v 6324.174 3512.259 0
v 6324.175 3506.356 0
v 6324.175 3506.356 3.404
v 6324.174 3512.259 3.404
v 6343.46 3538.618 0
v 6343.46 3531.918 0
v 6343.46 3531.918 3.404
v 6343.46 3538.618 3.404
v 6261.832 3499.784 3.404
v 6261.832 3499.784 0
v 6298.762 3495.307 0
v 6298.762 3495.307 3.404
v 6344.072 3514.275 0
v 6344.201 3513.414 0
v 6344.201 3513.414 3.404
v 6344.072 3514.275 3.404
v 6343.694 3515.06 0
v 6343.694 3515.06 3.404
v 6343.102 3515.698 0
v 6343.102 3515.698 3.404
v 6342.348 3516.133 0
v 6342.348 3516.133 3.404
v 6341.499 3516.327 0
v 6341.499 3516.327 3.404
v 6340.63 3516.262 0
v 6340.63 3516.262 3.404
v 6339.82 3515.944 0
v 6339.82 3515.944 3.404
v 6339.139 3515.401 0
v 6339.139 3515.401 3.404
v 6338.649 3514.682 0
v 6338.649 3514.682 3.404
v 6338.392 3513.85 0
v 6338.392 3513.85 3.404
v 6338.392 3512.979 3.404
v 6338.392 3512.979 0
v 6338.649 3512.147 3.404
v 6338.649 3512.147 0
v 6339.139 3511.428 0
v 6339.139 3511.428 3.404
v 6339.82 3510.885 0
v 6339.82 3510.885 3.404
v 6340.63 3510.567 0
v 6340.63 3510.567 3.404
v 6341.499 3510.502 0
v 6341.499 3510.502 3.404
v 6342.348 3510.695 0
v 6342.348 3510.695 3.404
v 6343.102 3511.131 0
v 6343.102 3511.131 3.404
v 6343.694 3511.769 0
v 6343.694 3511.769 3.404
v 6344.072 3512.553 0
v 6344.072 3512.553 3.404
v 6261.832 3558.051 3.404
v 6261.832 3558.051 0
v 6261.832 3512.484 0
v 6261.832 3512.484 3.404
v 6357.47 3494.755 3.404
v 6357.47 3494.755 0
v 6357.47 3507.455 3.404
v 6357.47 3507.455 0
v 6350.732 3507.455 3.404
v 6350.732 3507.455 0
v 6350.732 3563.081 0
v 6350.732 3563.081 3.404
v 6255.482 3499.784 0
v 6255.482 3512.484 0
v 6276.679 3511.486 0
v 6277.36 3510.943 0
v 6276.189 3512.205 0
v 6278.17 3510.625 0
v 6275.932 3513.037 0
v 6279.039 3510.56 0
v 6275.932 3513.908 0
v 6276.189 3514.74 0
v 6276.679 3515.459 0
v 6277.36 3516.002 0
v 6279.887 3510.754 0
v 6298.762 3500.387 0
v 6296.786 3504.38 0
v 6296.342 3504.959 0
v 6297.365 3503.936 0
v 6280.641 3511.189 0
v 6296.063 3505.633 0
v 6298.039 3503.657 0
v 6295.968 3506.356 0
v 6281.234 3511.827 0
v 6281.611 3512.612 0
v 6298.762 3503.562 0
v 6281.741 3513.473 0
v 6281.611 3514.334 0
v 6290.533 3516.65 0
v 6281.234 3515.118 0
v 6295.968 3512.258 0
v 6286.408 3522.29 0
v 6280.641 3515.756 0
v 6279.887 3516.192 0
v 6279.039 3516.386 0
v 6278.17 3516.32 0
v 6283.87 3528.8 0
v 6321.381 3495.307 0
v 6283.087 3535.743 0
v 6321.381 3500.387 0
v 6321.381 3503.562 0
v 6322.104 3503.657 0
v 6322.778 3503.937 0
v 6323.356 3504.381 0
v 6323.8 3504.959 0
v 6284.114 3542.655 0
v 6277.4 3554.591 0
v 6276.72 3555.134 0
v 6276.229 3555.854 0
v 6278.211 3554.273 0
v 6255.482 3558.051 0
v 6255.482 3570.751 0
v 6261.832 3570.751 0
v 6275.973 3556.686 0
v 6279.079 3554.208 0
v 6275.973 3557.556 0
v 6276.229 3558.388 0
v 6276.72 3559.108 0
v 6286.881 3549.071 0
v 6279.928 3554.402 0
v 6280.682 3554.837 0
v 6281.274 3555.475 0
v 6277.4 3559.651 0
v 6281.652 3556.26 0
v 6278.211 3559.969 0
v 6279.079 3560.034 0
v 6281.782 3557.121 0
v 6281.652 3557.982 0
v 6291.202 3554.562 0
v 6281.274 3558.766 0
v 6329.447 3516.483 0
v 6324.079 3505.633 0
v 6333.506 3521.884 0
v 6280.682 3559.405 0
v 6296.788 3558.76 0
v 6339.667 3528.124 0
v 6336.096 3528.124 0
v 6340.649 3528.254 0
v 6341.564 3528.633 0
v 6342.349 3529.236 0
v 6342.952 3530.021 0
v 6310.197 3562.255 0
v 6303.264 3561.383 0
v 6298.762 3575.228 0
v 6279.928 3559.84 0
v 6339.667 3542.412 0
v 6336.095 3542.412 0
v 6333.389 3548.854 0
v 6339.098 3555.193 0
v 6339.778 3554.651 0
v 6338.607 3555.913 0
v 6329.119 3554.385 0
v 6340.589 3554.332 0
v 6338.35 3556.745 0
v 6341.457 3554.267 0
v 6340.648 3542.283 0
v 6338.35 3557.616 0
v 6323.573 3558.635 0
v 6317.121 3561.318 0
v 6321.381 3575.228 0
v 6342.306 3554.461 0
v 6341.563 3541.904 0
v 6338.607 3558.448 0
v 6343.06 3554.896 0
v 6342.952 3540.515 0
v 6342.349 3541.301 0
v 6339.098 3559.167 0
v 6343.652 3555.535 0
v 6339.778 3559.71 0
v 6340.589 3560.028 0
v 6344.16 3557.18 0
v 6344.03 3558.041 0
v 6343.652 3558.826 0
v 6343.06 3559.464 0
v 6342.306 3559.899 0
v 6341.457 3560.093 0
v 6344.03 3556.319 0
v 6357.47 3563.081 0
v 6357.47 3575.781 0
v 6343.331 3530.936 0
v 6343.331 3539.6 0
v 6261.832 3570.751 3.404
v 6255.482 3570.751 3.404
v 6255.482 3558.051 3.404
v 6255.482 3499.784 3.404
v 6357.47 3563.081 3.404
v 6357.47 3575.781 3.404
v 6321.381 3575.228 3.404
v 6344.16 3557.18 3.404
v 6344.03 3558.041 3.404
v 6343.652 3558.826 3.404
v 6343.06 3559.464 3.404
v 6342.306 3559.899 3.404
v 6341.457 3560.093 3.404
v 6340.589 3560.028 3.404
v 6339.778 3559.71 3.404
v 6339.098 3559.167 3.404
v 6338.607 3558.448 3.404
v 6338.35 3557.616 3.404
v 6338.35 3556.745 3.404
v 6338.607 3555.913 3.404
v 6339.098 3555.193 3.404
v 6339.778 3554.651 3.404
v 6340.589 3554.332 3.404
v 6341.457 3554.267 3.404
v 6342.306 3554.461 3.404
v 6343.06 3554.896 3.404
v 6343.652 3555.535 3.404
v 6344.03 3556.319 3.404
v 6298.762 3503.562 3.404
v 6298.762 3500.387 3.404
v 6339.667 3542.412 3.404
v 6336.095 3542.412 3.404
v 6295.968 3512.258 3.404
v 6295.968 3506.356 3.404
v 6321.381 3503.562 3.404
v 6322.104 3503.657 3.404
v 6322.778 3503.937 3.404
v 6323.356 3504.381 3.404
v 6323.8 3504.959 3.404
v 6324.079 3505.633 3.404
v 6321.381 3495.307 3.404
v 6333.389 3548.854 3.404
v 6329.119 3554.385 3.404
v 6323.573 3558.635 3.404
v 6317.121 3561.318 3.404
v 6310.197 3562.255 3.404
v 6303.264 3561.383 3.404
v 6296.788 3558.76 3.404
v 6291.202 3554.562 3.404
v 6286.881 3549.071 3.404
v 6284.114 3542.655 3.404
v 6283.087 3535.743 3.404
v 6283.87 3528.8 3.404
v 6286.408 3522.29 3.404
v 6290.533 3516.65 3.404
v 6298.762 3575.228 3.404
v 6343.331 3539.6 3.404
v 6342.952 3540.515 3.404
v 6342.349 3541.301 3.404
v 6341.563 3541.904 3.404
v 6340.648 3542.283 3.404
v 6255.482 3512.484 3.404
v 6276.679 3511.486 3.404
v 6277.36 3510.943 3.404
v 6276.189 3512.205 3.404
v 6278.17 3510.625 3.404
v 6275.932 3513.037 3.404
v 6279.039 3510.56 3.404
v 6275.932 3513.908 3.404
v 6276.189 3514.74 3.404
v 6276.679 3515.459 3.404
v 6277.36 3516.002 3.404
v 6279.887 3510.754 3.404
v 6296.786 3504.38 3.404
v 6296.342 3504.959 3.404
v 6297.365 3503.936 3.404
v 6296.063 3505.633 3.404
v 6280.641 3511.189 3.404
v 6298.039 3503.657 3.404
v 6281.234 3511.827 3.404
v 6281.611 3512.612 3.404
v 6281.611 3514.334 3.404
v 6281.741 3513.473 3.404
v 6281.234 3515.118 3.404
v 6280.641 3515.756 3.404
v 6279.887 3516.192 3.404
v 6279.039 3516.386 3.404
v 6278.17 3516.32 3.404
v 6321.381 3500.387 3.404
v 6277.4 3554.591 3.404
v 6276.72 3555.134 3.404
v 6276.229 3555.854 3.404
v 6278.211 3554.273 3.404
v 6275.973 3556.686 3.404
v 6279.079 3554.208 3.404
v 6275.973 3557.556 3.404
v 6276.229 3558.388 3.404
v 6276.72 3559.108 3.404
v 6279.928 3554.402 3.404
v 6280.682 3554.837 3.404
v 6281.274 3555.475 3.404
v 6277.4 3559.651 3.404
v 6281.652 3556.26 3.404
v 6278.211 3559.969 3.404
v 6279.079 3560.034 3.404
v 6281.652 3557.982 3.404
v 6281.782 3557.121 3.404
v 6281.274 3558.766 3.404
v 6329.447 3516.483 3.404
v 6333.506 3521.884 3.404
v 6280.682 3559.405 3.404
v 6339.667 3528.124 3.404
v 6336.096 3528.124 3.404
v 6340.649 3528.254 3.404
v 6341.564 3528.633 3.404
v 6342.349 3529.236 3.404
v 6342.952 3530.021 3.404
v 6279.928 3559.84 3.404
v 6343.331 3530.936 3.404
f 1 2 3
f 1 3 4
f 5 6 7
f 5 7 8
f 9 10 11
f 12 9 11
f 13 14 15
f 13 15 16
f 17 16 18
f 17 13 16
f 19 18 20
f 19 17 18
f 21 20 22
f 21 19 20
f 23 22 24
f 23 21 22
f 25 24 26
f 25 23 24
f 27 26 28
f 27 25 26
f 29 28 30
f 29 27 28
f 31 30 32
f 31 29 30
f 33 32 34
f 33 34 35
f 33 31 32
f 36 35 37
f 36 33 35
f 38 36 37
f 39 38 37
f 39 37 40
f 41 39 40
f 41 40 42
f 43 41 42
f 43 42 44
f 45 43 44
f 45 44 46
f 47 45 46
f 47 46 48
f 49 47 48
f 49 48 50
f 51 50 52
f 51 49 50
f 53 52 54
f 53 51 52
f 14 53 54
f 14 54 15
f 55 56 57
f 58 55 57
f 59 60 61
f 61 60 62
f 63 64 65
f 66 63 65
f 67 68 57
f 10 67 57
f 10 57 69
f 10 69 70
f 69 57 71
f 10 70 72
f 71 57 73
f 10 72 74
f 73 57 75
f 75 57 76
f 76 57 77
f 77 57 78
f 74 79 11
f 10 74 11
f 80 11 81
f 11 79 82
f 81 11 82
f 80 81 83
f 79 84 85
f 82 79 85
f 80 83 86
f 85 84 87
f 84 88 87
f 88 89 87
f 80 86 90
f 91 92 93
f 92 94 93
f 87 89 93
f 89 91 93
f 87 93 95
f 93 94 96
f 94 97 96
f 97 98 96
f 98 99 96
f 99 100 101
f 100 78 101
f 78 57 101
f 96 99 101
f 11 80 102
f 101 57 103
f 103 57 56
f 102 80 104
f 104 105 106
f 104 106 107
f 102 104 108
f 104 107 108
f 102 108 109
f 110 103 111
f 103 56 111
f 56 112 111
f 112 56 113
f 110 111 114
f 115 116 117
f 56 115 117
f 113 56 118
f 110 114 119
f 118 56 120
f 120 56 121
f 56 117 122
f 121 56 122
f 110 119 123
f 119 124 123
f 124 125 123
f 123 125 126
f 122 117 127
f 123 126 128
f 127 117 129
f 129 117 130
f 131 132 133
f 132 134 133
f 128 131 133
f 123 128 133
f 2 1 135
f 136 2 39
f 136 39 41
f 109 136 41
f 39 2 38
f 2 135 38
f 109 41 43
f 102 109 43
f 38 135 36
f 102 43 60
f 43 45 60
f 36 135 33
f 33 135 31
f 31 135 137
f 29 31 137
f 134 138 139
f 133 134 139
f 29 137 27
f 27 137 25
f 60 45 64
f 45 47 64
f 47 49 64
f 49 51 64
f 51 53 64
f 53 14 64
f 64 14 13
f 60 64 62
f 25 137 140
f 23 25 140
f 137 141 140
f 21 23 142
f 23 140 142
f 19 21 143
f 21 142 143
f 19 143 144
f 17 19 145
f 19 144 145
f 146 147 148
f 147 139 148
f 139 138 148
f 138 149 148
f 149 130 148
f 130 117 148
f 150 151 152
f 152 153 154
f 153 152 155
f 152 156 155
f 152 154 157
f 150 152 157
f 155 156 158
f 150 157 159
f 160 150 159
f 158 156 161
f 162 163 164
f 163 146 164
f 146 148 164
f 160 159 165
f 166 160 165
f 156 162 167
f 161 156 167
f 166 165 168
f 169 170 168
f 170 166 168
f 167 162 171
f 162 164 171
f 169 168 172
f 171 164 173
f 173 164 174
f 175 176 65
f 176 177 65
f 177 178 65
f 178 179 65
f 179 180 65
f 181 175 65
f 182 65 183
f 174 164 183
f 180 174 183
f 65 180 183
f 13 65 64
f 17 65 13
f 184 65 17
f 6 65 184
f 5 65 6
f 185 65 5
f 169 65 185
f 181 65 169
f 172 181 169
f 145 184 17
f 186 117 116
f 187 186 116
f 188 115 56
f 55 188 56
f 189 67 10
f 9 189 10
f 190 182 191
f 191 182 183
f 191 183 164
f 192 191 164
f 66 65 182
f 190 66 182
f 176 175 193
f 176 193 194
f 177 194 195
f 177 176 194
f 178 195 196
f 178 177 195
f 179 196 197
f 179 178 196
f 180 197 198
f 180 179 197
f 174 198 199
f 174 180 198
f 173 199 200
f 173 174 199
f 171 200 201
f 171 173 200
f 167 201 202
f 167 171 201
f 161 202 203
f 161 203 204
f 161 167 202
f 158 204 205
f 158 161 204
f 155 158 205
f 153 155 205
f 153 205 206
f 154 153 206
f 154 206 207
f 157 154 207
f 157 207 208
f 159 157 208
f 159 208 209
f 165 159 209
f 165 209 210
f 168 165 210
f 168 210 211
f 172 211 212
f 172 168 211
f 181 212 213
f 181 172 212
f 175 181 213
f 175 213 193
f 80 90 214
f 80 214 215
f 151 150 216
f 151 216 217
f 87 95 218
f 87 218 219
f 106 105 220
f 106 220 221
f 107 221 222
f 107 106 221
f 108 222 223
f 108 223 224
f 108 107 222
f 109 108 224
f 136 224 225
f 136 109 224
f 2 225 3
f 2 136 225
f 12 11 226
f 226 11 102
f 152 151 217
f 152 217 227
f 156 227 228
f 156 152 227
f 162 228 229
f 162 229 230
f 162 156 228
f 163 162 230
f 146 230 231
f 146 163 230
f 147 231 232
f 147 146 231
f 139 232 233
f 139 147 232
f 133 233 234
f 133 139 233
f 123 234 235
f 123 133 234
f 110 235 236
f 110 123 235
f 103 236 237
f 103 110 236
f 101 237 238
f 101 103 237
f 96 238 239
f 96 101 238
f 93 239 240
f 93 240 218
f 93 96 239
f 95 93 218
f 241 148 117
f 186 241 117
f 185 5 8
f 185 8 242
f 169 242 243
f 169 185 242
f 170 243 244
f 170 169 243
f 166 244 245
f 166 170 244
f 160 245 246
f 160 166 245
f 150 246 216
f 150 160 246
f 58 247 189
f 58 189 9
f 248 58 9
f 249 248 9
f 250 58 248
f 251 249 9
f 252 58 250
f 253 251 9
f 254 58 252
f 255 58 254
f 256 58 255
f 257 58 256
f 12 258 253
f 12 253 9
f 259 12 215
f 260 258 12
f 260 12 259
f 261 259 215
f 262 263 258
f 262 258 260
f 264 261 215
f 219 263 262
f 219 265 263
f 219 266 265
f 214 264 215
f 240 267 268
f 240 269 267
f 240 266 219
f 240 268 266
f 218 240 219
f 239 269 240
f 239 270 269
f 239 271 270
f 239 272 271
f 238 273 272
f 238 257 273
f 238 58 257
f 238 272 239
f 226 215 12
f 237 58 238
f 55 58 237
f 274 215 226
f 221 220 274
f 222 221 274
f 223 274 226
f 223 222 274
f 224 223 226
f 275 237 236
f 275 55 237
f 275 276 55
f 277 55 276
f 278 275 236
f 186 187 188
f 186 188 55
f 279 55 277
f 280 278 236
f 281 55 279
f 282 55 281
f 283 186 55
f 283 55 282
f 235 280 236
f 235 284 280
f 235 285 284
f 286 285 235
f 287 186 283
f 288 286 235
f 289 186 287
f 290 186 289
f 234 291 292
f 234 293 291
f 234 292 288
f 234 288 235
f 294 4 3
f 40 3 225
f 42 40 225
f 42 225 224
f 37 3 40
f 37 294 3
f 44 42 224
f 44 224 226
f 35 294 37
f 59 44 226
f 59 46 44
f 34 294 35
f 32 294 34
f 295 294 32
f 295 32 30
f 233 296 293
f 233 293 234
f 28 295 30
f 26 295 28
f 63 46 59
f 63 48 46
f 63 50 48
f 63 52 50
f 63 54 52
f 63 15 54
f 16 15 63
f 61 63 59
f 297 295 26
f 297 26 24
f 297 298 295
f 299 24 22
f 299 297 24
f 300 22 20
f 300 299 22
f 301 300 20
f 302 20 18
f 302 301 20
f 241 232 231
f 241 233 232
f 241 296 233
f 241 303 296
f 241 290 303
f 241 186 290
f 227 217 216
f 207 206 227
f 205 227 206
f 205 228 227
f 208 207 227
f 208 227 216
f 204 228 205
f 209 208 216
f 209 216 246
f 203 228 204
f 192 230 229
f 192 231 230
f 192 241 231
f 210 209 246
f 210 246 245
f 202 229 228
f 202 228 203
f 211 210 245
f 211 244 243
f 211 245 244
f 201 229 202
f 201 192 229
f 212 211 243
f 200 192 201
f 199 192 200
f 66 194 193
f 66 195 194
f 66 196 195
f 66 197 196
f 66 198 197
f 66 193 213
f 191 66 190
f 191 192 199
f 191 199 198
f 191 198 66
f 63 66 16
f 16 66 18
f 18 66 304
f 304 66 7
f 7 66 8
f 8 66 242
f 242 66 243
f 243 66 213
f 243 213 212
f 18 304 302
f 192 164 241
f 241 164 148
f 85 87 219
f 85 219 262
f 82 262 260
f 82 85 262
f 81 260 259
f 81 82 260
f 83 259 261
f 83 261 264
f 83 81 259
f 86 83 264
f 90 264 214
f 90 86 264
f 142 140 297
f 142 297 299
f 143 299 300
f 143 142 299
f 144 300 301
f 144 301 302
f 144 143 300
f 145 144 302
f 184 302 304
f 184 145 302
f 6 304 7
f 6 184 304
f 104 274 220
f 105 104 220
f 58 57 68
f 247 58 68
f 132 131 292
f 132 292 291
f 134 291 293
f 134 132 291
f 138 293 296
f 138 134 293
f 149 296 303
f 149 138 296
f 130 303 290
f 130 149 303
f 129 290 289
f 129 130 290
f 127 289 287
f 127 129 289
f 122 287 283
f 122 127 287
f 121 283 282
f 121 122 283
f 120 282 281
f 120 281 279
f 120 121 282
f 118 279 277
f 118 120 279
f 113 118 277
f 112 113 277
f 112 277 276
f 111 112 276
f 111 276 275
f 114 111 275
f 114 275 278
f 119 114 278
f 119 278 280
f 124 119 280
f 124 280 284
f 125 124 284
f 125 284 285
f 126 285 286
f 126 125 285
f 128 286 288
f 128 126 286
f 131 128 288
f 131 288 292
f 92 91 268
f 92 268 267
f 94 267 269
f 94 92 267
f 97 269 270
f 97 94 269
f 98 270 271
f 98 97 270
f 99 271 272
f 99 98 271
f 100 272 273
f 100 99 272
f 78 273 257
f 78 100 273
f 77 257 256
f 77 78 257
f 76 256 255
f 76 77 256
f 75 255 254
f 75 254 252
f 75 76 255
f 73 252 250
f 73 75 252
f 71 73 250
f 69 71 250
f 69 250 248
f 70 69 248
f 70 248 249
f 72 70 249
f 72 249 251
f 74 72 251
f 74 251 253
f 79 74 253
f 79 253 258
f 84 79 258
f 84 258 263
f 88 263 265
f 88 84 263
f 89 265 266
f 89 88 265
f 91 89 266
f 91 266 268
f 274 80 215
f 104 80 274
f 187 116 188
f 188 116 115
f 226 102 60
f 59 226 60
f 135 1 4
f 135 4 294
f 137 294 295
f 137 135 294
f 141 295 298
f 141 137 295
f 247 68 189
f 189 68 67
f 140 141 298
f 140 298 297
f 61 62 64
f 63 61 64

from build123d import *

# Parameters (mm, degrees)
SKETCH1_R           = 2.921000021
BOSS_EXTRUDE1_DEPTH = 3.4036


with BuildPart() as part:
    # Sketch1 → Boss-Extrude1 (new body)
    with BuildSketch(Plane.XY):
        Polygon((6298.761762124, 3495.306881262), (6321.380962278, 3495.307266858), (6357.4701776, 3494.754624258), (6357.4701776, 3507.454624258), (6350.731610594, 3507.454624258), (6350.731610594, 3563.080624258), (6357.4701776, 3563.080624258), (6357.4701776, 3575.780624258), (6321.380962278, 3575.227981658), (6298.761762124, 3575.228367254), (6261.831610594, 3570.751424258), (6255.481610594, 3570.751424258), (6255.481610594, 3558.051424258), (6261.831610594, 3558.051424258), (6261.831610594, 3512.483824258), (6255.481610594, 3512.483824258), (6255.481610594, 3499.783824258), (6261.831610594, 3499.783824258), align=None)
        with Locations((6278.820230754, 3513.47268496)):
            Circle(SKETCH1_R, mode=Mode.SUBTRACT)
        with Locations((6341.280374087, 3513.414361889)):
            Circle(SKETCH1_R, mode=Mode.SUBTRACT)
        with Locations((6341.23876101, 3557.180196157)):
            Circle(SKETCH1_R, mode=Mode.SUBTRACT)
        with Locations((6278.860987901, 3557.120886627)):
            Circle(SKETCH1_R, mode=Mode.SUBTRACT)
        with BuildLine():
            Line((6343.460429176, 3531.918193441), (6343.460314953, 3538.618193502))
            ThreePointArc((6343.460314953, 3538.618193502), (6342.349105565, 3541.300760923), (6339.666500257, 3542.411878844))
            Line((6339.666500257, 3542.411878844), (6336.09539352, 3542.411817963))
            ThreePointArc((6336.09539352, 3542.411817963), (6293.858290099, 3556.842691981), (6295.967723135, 3512.258240403))
            Line((6295.967723135, 3512.258240403), (6295.96782376, 3506.355583647))
            ThreePointArc((6295.96782376, 3506.355583647), (6296.78612787, 3504.380118018), (6298.761621398, 3503.561881261))
            Line((6298.761621398, 3503.561881261), (6298.761675524, 3500.386881261))
            Line((6298.761675524, 3500.386881261), (6321.380875678, 3500.387266857))
            Line((6321.380875678, 3500.387266857), (6321.380821552, 3503.562266857))
            ThreePointArc((6321.380821552, 3503.562266857), (6323.356287182, 3504.380570967), (6324.174523939, 3506.356064496))
            Line((6324.174523939, 3506.356064496), (6324.174423315, 3512.258721235))
            ThreePointArc((6324.174423315, 3512.258721235), (6331.646301452, 3519.055968956), (6336.095637085, 3528.124317864))
            Line((6336.095637085, 3528.124317864), (6339.666743834, 3528.124378745))
            ThreePointArc((6339.666743834, 3528.124378745), (6342.349311255, 3529.235588133), (6343.460429176, 3531.918193441))
        make_face(mode=Mode.SUBTRACT)
    extrude(amount=BOSS_EXTRUDE1_DEPTH)


solid = part.part
